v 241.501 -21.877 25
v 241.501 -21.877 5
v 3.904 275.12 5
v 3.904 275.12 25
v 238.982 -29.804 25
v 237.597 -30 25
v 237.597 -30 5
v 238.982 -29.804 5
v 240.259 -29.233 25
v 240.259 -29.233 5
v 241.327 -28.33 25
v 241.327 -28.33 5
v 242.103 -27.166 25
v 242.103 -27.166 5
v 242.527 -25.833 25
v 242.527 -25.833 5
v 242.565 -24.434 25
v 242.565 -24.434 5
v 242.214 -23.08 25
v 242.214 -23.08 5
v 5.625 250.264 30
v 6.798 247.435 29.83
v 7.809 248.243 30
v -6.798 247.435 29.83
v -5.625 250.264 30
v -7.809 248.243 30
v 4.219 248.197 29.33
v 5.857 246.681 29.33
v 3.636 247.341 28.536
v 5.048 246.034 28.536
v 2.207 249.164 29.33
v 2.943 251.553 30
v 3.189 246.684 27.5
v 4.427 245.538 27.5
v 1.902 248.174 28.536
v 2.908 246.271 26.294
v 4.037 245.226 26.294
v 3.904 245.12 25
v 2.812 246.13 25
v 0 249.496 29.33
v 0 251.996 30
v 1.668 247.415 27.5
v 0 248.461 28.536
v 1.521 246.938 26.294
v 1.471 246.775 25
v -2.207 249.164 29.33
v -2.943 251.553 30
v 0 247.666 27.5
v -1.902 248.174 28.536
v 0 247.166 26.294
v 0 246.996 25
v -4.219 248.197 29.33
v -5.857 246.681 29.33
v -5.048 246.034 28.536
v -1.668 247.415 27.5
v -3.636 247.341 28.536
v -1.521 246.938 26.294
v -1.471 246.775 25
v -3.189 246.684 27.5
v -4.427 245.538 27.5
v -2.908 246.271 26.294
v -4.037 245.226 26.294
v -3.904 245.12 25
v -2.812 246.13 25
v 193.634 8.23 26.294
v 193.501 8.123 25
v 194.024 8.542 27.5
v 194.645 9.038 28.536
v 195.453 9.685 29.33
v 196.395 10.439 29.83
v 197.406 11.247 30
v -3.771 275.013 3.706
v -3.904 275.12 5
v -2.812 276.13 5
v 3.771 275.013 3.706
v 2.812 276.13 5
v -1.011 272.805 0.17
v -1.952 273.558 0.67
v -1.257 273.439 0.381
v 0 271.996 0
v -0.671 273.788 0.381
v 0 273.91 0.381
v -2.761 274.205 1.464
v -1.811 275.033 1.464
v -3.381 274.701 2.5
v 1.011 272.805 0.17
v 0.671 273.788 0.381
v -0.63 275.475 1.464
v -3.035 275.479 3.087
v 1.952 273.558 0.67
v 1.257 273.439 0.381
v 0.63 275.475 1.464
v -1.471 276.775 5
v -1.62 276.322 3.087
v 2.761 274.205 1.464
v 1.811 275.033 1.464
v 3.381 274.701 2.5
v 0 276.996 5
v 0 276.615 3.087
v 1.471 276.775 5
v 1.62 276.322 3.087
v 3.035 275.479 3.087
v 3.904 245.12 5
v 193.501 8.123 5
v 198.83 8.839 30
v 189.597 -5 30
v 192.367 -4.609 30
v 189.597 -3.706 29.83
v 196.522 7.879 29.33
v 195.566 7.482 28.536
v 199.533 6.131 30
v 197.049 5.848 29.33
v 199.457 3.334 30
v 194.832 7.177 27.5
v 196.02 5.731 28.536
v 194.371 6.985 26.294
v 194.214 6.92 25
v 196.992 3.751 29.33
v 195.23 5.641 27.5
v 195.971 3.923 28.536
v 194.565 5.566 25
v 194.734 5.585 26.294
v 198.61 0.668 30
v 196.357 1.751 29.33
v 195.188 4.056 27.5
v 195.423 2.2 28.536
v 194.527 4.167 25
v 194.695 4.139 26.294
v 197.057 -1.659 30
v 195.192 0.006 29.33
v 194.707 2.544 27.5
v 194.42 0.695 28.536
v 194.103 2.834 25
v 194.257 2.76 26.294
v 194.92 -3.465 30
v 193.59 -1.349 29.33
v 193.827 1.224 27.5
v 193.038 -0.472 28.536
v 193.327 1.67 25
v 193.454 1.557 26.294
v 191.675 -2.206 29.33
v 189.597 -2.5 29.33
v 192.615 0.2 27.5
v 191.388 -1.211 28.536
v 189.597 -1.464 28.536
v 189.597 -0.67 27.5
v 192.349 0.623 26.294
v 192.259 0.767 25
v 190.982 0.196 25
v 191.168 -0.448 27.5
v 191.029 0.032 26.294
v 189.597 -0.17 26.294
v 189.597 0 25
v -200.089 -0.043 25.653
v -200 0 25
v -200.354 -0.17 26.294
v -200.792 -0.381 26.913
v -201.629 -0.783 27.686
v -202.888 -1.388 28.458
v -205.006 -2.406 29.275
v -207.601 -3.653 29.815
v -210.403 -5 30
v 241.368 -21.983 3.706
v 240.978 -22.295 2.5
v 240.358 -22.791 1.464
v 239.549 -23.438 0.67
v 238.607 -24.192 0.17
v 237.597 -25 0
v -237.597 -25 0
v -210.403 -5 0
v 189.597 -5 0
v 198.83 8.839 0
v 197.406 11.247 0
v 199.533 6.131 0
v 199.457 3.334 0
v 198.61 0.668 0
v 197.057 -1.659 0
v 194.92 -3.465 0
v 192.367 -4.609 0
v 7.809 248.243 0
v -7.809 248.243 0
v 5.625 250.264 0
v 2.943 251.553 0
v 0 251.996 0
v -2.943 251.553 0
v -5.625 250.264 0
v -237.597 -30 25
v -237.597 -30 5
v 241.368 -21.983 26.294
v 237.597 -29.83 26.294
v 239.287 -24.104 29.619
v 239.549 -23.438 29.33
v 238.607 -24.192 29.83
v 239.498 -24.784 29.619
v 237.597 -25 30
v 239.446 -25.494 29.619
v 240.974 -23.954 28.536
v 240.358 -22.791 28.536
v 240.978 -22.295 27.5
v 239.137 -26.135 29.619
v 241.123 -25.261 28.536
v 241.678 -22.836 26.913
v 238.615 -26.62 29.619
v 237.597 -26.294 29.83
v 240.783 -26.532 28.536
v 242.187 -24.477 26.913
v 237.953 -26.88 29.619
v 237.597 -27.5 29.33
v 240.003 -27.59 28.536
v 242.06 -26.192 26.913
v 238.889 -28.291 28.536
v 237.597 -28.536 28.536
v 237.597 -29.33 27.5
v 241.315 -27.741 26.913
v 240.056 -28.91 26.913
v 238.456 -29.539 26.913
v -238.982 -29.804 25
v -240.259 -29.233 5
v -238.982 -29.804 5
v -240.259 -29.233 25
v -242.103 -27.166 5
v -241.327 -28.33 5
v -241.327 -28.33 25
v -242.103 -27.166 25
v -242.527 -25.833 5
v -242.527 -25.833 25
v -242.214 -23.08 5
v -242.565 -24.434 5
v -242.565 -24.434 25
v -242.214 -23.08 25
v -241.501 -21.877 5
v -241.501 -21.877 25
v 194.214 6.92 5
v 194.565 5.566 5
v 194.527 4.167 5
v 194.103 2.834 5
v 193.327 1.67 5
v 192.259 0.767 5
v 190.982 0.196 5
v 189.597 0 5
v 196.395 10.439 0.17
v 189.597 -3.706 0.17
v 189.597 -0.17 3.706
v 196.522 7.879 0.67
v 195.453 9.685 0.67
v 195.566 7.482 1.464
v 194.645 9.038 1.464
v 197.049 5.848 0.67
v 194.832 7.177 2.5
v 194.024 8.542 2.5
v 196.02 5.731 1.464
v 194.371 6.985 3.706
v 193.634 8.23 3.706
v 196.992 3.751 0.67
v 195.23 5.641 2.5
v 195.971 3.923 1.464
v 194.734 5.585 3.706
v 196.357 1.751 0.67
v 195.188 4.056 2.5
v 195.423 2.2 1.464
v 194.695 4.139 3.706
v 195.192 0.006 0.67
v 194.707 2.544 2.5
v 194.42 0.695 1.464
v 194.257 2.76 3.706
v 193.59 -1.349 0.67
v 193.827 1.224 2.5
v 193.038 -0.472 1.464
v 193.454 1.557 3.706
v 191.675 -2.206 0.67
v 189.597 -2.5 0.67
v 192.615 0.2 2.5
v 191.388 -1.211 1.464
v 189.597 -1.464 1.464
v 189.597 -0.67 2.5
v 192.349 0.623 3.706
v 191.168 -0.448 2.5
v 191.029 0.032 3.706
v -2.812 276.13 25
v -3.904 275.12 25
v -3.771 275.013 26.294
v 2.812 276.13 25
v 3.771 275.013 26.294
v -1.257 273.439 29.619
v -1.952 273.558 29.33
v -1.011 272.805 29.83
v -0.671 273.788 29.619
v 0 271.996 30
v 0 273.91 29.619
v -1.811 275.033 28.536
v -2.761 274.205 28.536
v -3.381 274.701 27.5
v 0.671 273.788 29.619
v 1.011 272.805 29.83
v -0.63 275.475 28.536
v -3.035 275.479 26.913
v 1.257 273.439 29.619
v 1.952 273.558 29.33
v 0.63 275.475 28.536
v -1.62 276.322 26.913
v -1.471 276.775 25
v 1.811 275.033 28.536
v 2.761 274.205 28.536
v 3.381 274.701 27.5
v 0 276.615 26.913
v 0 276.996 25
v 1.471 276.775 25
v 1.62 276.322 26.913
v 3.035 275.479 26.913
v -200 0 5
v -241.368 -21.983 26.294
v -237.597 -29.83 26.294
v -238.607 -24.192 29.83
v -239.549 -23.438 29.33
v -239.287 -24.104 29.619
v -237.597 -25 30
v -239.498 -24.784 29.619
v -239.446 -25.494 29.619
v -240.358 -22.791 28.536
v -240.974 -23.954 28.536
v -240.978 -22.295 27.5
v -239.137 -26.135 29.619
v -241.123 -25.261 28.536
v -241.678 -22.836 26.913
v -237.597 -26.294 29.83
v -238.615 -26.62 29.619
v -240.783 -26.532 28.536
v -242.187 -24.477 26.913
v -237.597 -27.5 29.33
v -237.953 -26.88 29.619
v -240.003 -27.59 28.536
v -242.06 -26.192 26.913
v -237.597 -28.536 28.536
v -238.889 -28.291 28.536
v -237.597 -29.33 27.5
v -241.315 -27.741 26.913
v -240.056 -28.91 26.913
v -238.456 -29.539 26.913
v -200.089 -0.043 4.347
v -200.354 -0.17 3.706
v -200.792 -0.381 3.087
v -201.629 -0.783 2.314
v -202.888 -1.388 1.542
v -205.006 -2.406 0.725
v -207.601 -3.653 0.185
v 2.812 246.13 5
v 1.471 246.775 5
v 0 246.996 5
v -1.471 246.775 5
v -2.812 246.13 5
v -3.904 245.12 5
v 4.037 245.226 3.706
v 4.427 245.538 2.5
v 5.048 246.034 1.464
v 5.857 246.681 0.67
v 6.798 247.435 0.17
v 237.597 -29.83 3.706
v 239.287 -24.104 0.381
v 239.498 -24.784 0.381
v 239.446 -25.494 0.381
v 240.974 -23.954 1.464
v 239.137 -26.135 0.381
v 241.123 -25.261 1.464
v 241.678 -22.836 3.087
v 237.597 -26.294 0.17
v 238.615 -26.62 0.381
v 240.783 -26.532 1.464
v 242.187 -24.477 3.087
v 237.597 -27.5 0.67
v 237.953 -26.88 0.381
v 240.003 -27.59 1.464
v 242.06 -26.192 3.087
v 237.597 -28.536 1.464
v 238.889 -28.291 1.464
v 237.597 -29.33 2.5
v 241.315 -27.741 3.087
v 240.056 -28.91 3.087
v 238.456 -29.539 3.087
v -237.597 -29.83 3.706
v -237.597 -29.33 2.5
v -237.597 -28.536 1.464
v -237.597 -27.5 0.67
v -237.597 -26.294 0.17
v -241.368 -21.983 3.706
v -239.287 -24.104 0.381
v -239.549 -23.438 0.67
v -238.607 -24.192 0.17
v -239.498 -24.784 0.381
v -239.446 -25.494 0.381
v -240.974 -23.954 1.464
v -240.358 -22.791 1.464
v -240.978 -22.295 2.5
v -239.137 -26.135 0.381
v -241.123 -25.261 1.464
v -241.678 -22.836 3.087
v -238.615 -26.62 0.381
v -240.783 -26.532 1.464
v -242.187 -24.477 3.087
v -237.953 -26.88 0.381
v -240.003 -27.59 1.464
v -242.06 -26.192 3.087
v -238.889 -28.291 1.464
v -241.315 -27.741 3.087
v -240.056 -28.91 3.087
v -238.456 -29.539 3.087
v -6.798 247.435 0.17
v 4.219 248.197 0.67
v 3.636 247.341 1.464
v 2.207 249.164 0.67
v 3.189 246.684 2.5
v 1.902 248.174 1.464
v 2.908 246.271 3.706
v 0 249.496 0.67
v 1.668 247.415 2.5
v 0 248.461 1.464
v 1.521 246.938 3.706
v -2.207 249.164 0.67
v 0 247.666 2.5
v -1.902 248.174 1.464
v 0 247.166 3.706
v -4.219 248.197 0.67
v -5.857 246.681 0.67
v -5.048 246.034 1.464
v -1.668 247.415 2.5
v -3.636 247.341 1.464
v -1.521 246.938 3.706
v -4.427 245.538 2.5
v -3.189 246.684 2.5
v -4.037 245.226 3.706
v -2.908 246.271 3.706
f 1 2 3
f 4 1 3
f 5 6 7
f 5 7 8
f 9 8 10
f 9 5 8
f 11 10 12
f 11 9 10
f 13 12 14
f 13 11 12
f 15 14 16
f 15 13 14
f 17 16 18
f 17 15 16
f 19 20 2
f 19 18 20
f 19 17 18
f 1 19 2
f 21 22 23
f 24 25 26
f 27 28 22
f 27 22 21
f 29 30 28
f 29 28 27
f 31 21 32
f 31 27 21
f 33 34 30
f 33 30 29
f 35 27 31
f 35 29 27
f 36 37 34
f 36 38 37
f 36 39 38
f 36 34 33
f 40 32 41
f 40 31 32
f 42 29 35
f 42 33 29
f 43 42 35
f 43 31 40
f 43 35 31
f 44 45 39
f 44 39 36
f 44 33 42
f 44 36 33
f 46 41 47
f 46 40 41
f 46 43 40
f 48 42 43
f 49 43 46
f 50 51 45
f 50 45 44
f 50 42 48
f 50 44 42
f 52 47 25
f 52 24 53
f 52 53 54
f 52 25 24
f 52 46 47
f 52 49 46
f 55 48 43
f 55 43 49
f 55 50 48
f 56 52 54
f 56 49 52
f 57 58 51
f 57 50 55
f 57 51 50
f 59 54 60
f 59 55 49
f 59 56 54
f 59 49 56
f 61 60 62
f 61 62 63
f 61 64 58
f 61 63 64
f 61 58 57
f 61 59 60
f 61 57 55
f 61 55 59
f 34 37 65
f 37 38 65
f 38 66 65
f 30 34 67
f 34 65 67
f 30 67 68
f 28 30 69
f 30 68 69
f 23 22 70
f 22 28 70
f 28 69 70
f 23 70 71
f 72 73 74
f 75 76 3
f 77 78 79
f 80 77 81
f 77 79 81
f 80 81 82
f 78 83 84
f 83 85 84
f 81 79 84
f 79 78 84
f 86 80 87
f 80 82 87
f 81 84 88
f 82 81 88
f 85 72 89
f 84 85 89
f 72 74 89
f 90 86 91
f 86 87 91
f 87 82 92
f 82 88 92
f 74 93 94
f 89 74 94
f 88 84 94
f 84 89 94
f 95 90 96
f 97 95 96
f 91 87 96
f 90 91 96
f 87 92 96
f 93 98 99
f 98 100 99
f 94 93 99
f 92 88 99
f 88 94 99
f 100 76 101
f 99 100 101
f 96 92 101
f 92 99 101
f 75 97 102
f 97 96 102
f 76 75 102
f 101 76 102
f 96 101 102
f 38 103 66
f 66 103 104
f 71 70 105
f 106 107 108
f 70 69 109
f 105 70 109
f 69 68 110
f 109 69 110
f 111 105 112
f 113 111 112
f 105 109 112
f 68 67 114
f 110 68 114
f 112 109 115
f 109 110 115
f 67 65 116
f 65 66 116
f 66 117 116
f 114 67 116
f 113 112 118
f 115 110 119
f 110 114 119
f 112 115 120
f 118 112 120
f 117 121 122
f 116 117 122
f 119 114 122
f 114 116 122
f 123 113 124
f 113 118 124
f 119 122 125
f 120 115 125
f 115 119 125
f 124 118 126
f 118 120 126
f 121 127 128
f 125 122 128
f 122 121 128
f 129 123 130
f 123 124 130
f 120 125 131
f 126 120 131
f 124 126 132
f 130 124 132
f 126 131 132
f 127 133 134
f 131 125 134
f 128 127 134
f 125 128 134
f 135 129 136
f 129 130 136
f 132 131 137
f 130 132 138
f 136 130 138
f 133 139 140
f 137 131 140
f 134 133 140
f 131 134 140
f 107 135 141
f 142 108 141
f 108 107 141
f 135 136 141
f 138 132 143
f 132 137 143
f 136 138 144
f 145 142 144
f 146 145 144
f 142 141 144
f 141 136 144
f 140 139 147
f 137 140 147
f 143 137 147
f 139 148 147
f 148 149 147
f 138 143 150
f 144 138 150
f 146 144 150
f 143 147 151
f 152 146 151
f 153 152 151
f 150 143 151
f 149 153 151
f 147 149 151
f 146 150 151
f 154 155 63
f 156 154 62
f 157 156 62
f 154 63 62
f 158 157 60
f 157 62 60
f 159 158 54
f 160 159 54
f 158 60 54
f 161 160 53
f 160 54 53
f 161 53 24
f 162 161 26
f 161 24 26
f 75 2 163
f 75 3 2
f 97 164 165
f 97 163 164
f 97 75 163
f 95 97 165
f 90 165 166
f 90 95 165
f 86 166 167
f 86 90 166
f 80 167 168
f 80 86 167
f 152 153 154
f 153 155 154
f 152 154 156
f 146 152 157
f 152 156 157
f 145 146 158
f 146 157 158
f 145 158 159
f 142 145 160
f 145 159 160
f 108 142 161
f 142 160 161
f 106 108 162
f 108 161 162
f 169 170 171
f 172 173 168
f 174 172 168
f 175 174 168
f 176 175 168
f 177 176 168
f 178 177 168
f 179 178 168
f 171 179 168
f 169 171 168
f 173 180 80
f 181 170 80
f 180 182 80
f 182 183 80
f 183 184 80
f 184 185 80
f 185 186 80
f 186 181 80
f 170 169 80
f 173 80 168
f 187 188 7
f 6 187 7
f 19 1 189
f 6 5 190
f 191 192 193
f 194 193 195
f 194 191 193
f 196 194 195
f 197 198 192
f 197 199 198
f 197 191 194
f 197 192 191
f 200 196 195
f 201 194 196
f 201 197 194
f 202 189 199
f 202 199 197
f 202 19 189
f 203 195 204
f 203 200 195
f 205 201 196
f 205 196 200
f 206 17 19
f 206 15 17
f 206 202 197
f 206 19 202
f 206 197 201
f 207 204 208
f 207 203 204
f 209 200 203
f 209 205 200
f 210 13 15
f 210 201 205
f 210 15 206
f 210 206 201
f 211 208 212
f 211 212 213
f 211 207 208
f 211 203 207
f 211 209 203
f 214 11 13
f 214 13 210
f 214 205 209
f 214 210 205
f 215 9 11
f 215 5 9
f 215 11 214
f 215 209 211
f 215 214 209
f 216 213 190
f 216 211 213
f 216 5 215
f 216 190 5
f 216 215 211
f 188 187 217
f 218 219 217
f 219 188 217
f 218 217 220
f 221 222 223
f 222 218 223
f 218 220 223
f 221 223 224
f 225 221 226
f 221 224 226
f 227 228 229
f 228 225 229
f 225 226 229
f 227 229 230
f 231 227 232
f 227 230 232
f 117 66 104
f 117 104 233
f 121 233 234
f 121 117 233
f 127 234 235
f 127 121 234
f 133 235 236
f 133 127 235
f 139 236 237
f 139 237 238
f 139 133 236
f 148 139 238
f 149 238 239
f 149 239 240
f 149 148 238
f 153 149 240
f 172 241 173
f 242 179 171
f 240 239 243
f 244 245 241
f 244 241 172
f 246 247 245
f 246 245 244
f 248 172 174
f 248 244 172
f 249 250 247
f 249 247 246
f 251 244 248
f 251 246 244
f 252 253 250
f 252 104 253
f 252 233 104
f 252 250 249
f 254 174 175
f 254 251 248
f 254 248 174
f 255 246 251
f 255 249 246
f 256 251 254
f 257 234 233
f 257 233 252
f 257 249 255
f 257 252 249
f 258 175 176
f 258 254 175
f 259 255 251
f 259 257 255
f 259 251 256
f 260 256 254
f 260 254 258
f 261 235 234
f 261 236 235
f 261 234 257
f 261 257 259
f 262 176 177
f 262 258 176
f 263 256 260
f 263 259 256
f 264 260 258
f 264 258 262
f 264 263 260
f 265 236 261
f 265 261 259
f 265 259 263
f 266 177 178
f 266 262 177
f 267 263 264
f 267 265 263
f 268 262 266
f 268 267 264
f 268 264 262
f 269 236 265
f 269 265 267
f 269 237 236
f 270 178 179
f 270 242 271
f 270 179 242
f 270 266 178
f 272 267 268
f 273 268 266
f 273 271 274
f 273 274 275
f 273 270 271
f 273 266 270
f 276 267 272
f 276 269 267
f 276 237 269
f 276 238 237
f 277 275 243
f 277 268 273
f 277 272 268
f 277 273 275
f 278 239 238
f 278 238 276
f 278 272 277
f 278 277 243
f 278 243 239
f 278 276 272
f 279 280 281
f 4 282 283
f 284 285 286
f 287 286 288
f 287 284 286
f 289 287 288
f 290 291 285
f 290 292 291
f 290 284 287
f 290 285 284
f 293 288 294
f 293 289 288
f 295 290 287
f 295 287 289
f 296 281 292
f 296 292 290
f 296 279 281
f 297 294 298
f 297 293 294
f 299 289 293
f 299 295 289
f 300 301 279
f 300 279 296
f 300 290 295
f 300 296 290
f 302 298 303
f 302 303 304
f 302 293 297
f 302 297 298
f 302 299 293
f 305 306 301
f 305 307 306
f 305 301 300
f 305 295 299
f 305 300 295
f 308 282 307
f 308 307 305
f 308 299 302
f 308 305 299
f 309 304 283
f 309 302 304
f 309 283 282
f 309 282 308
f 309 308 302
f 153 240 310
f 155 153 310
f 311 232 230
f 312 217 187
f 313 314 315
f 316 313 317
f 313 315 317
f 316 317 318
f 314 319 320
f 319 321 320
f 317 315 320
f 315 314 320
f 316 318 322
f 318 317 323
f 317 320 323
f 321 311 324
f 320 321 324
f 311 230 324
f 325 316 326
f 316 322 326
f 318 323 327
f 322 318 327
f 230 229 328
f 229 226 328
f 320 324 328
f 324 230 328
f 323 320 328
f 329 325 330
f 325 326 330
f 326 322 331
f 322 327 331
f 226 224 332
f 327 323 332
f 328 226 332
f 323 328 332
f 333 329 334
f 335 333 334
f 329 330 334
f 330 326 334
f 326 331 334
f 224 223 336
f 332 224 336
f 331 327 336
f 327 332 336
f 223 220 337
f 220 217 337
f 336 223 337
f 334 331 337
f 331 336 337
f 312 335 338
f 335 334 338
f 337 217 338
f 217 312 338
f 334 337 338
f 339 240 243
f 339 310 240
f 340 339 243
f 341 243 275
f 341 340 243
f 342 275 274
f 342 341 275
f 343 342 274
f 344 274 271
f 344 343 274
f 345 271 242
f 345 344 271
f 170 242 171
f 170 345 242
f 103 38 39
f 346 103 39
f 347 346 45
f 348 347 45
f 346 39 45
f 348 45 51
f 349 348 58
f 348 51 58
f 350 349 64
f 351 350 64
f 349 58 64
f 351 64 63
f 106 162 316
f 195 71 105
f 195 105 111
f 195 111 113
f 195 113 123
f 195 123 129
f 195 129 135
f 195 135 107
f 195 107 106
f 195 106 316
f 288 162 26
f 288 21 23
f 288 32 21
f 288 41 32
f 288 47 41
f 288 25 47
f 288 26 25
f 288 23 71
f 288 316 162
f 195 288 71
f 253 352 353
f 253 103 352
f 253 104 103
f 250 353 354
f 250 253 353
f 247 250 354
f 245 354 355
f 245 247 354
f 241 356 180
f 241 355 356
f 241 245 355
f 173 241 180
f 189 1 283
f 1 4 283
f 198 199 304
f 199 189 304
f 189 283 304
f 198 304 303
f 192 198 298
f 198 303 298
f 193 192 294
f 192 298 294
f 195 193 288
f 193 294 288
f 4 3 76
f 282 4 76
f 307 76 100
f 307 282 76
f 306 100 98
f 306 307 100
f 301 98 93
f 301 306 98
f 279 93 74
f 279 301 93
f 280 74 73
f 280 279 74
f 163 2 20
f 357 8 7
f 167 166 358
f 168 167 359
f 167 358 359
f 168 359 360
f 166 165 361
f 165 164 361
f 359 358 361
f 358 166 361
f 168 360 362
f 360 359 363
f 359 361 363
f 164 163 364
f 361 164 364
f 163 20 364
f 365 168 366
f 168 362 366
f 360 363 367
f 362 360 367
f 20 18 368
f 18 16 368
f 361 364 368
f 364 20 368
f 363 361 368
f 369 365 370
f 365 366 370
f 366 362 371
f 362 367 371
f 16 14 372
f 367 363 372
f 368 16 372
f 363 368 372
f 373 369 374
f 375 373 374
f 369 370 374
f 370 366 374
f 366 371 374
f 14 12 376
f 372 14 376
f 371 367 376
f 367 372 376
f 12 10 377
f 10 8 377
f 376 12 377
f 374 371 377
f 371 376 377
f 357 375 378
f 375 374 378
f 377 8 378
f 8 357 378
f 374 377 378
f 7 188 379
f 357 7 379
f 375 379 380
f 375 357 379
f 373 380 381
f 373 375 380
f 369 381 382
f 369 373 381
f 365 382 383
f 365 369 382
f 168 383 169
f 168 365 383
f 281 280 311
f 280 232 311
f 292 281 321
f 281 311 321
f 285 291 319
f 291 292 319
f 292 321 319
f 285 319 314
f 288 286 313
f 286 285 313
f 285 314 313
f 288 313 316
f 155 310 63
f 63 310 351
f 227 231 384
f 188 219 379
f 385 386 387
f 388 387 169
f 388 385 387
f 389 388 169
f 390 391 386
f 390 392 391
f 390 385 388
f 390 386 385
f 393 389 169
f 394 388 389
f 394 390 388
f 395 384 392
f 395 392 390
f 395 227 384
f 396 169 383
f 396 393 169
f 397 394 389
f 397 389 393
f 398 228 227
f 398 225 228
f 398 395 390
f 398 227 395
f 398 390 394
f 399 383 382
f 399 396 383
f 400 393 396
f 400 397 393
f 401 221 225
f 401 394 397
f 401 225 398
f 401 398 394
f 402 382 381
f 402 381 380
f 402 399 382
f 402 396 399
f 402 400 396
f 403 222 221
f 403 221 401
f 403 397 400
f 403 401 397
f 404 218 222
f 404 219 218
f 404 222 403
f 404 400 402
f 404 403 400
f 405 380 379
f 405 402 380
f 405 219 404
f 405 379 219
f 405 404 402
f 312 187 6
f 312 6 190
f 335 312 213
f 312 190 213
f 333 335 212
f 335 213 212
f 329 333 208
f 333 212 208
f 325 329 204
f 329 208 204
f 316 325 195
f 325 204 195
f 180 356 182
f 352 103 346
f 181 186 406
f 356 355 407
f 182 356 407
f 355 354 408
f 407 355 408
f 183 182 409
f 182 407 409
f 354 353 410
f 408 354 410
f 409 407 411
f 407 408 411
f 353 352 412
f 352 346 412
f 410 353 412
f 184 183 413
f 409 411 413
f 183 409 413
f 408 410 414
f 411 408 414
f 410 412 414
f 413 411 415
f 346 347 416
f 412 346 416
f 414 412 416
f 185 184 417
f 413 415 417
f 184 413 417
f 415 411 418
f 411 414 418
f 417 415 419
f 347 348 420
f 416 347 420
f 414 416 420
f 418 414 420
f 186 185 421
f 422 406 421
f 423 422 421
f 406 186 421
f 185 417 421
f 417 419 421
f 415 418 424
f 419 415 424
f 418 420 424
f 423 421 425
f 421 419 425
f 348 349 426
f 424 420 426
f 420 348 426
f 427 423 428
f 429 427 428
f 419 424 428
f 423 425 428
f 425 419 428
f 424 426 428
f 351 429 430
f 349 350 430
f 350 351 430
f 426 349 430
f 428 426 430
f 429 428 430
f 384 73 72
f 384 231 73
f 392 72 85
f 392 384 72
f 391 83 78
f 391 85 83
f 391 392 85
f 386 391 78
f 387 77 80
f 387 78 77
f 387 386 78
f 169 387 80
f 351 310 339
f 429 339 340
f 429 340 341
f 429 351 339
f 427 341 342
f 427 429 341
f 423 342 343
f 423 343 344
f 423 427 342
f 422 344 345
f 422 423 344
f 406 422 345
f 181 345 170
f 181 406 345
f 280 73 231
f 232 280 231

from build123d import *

# Parameters (mm, degrees)
F1_DEPTH = 30
F2_R     = 5


with BuildPart() as f1:
    # F0 (on Top) → F1 (new body)
    with BuildSketch(Plane.XY):
        Polygon((-248, -30), (0, -30), (248, -30), (0, 280), align=None)
        Polygon((200, 0), (0, 0), (-200, 0), (0, 250), align=None, mode=Mode.SUBTRACT)
    extrude(amount=F1_DEPTH)

    # F2
    f2_edges = [f1.edges().sort_by_distance(p)[0] for p in [
        (0, 280, 15),
        (-248, -30, 15),
        (-124, 125, 0),
        (-124, 125, 30),
        (248, -30, 15),
        (124, 125, 0),
        (124, 125, 30),
        (0, -30, 30),
        (0, -30, 0),
        (0, 0, 30),
        (-100, 125, 30),
        (0, 250, 15),
        (200, 0, 15),
        (100, 125, 0),
        (100, 125, 30),
        (0, 0, 0),
        (-100, 125, 0),
    ]]
    fillet(f2_edges, radius=F2_R)


solid = f1.part
